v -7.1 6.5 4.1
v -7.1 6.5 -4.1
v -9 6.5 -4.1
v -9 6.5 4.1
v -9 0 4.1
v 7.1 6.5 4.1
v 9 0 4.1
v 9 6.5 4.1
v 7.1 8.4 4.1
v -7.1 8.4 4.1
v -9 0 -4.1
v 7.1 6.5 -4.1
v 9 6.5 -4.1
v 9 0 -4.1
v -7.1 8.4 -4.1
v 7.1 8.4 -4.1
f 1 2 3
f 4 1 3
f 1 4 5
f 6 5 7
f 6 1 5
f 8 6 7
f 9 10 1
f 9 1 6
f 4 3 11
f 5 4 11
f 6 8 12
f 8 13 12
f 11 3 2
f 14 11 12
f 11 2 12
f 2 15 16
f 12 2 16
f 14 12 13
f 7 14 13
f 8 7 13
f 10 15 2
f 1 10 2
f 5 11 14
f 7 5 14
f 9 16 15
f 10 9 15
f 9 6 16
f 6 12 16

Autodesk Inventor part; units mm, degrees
sketch "Sketch_1" plane through (0, 0, 0) normal (0, 0, 1) x (1, 0, 0)
  line L0 (-9, 6.5) -> (-9, 0)
  line L1 (-9, 0) -> (9, 0)
  line L2 (9, 0) -> (9, 6.5)
  line L3 (9, 6.5) -> (7.1, 6.5)
  line L4 (7.1, 6.5) -> (7.1, 8.4)
  line L5 (7.1, 8.4) -> (-7.1, 8.4)
  line L6 (-7.1, 8.4) -> (-7.1, 6.5)
  line L7 (-7.1, 6.5) -> (-9, 6.5)
extrude "Extrusion1" add sketch "Sketch_1" along normal mid plane 8.2
ref_plane "p1_XY" through (0, 0, 0) normal (0, 1, 0) x (1, 0, 0)
ref_plane "p1_YZ" through (0, 0, 0) normal (1, 0, 0) x (0, 0, -1)
ref_plane "p1_ZX" through (0, 0, 0) normal (0, 0, -1) x (0, 1, 0)
properties part number "GUS Zentriereinsatz"
